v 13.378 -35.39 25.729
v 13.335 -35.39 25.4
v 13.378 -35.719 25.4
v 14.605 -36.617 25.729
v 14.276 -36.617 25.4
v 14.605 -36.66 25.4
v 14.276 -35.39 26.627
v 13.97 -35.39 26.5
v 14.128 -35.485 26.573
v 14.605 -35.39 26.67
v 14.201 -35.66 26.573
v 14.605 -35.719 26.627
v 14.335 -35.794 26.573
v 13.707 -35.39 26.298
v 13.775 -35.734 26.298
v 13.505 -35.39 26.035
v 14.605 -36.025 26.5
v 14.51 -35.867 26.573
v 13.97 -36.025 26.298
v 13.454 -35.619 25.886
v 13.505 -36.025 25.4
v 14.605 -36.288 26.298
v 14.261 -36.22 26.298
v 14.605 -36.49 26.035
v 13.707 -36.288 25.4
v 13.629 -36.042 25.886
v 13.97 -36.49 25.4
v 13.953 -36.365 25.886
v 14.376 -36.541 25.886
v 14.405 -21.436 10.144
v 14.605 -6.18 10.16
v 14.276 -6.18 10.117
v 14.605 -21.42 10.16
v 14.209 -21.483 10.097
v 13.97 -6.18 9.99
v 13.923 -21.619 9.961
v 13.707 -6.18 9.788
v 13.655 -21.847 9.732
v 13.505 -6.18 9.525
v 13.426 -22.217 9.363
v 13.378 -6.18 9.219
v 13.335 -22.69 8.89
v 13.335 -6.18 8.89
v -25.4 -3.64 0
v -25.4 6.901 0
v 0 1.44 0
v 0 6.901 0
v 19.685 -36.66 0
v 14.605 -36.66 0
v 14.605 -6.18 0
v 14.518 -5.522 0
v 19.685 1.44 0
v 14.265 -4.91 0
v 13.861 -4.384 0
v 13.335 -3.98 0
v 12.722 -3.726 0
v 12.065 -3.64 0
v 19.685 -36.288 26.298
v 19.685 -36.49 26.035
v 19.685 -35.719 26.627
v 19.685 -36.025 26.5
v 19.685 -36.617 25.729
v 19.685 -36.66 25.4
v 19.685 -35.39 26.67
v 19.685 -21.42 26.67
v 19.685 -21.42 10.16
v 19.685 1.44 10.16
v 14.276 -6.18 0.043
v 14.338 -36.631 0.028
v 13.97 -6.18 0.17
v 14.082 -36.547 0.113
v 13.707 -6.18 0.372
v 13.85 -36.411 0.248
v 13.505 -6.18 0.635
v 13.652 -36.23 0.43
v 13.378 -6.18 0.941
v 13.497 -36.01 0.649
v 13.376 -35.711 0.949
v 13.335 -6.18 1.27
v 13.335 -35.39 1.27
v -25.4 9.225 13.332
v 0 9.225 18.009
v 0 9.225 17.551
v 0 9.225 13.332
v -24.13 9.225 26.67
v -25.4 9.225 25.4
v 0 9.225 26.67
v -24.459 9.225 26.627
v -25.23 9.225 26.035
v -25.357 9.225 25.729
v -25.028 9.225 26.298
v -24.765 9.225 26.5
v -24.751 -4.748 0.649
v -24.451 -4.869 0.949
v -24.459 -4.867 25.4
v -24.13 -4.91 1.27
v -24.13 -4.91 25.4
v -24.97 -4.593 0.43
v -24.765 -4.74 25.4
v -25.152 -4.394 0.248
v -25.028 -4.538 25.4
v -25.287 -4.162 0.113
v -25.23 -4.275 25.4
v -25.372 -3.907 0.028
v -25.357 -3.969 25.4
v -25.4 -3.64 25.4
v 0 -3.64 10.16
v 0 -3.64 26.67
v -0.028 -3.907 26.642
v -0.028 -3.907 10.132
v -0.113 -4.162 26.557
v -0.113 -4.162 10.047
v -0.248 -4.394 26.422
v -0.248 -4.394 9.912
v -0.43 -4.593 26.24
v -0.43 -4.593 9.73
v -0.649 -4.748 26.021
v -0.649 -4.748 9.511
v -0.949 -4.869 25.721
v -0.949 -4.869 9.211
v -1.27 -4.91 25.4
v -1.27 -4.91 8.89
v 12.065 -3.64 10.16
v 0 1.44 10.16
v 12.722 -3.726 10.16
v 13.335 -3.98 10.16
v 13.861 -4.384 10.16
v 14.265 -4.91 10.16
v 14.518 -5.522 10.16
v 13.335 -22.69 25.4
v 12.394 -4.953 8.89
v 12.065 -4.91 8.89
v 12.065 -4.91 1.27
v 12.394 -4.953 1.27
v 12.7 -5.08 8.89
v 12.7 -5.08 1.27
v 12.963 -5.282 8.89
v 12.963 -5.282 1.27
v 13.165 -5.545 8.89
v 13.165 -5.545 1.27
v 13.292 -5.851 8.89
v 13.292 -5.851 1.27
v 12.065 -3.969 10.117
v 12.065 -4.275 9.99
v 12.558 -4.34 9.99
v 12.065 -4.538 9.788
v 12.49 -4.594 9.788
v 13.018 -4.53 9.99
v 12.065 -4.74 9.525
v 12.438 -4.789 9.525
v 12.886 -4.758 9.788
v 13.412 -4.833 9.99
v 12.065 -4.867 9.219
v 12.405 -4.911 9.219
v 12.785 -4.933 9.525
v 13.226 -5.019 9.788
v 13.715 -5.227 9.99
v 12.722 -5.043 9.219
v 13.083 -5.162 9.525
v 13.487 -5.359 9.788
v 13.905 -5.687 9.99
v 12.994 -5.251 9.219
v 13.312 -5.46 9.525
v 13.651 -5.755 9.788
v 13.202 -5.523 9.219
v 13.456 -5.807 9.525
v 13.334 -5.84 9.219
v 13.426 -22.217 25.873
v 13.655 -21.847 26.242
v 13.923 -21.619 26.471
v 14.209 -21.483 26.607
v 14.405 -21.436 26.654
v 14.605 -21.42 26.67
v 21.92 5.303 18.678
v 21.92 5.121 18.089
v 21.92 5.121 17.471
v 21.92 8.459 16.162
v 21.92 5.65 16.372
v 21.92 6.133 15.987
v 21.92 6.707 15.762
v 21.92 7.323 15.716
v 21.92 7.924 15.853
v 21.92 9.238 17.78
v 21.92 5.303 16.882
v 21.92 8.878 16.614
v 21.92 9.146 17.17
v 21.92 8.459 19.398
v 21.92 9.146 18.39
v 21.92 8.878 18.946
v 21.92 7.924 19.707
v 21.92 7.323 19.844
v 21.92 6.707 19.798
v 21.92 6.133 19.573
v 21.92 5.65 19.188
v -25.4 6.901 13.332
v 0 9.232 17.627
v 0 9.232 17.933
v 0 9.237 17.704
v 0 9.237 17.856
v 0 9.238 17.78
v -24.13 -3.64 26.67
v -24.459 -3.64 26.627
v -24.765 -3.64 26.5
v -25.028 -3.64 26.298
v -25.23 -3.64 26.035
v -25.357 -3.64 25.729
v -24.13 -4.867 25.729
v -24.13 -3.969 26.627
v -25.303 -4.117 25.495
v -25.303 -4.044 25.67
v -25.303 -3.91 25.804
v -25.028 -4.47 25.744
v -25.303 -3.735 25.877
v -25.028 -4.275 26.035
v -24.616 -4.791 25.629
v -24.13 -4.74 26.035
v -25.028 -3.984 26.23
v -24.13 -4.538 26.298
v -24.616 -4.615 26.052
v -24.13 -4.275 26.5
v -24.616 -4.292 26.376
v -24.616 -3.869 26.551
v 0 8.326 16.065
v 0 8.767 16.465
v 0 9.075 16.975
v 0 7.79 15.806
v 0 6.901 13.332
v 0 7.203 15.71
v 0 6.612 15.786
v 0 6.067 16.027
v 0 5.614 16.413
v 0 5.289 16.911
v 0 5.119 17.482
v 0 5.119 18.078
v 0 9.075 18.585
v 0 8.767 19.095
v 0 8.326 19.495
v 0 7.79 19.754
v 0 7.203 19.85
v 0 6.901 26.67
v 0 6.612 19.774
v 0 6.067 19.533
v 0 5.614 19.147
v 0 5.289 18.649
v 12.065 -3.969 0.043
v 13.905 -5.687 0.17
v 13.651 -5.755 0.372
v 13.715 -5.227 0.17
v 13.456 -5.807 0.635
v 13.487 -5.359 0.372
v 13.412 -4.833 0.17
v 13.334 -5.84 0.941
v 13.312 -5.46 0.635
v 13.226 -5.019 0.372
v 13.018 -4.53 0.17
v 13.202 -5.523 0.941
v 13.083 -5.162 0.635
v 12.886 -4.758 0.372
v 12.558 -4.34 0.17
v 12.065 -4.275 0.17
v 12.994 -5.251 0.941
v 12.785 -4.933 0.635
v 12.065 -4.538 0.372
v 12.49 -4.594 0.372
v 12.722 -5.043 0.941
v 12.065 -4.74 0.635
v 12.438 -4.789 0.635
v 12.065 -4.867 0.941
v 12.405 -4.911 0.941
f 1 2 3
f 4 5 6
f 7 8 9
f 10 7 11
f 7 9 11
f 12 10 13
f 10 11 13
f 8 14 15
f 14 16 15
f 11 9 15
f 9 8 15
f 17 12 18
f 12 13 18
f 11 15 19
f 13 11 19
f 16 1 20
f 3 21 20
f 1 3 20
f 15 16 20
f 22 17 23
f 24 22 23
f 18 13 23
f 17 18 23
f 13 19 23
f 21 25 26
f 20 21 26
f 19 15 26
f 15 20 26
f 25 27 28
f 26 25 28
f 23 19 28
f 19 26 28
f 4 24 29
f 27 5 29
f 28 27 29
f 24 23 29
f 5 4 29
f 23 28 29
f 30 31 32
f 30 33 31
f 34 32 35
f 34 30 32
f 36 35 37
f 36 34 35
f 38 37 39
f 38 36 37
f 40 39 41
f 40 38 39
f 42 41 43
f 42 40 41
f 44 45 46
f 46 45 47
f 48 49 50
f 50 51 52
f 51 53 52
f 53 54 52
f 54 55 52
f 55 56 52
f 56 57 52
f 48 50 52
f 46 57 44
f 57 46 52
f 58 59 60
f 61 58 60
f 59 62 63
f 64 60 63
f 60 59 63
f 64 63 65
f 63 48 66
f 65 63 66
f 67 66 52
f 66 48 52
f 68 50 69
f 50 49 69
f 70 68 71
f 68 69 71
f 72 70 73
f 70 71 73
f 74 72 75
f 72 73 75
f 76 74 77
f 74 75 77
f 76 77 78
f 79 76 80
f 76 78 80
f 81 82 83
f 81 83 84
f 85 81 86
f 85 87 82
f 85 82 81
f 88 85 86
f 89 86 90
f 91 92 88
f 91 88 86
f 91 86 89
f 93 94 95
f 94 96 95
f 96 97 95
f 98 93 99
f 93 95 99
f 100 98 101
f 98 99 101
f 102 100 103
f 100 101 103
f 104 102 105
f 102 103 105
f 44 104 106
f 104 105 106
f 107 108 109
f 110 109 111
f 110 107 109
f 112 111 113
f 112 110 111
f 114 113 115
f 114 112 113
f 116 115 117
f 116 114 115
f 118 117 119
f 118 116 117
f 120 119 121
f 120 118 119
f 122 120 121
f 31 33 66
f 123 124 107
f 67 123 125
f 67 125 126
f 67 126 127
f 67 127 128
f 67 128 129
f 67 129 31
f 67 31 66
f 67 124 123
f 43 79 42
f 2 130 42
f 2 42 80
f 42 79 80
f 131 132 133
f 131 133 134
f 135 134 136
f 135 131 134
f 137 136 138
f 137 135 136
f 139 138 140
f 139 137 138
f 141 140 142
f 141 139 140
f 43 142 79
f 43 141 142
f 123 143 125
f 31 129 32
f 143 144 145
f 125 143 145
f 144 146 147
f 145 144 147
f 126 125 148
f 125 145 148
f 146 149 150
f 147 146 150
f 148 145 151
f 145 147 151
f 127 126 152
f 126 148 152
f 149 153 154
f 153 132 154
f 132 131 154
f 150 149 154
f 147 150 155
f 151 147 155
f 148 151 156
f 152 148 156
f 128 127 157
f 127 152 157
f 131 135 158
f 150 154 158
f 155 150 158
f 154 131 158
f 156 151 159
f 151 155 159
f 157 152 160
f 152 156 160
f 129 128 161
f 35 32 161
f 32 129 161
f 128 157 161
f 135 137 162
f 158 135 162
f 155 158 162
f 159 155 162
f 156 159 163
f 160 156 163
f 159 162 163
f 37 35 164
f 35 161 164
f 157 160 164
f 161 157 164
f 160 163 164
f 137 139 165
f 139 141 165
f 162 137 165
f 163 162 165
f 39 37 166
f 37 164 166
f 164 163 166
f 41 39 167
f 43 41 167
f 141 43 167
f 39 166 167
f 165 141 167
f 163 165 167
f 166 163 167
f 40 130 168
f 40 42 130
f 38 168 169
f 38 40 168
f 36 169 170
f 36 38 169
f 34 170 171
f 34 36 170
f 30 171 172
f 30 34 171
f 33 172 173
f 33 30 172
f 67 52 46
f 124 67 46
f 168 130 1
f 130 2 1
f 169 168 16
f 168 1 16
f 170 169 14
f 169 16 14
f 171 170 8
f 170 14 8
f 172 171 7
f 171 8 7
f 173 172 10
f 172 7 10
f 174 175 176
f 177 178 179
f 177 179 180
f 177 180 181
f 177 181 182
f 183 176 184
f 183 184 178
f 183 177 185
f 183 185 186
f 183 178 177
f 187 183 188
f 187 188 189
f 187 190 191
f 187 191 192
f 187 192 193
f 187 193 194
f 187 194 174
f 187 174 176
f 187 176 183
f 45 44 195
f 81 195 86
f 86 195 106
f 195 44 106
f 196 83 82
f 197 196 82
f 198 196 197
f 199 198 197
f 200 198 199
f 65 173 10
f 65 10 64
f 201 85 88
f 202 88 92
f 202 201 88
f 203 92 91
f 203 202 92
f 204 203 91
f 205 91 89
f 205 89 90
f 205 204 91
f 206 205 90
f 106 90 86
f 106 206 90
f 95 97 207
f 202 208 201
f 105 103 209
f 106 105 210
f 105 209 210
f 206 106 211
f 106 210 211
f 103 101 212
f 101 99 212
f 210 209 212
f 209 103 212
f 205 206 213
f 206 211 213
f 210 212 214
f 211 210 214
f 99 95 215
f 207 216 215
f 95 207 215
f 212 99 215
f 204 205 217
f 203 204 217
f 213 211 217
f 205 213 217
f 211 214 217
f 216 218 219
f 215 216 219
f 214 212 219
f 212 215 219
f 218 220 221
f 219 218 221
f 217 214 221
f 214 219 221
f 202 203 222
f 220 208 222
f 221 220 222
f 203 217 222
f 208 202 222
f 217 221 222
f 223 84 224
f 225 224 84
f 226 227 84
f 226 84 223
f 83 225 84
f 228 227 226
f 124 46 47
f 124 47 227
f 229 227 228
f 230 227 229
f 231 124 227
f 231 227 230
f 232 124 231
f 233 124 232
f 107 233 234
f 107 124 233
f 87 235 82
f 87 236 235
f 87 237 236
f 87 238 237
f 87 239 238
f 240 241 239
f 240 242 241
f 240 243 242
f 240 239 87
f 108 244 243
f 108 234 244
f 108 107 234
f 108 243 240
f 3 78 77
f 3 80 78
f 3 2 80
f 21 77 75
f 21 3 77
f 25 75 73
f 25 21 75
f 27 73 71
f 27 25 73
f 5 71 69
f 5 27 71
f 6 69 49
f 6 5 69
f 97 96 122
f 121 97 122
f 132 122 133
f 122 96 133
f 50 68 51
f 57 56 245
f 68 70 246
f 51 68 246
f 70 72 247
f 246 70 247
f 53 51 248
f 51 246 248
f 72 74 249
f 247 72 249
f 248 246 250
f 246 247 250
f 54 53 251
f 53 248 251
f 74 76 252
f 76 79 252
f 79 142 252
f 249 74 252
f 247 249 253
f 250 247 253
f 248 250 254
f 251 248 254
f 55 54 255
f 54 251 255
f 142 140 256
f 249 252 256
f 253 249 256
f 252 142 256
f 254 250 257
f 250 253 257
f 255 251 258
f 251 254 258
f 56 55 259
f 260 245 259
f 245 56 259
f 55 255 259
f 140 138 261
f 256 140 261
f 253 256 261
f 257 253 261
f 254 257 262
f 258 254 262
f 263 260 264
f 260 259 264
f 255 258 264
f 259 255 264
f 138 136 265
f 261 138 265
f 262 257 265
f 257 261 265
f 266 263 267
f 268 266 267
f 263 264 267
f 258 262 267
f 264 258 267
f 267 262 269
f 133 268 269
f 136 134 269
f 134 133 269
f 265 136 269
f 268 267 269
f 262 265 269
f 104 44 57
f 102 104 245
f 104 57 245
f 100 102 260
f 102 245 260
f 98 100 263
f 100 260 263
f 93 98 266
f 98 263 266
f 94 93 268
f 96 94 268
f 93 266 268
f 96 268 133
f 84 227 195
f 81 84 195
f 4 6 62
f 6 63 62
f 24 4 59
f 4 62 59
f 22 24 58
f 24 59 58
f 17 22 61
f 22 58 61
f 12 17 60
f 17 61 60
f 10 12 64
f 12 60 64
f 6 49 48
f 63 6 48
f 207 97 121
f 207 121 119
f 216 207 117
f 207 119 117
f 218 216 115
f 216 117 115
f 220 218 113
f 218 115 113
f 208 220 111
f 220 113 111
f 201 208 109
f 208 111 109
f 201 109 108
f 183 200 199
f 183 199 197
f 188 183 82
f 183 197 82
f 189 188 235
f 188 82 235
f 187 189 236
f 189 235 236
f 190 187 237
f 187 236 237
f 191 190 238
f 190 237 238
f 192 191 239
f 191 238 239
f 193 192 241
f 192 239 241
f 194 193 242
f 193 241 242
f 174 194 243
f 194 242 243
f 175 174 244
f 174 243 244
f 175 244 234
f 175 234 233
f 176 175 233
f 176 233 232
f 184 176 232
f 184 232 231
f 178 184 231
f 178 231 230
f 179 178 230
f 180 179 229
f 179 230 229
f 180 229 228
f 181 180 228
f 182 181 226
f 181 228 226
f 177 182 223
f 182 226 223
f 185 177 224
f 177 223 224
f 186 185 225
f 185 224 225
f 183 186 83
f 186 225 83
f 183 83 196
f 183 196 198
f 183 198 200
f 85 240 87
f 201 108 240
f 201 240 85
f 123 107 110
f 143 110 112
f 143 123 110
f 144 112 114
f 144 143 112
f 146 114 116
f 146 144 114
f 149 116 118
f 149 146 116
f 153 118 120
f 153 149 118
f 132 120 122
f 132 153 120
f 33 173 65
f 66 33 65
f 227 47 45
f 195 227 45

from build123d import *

# Parameters (mm, degrees)
F1_DEPTH = 26.67
F2_W     = 13.335
F2_H     = 6.35
F3_DEPTH = 16.51
F4_W     = 25.4
F4_H     = 13.3375799713
F5_DEPTH = 2.3241
F6_R     = 2.0701
F7_DEPTH = 21.9202
F8_R     = 1.27


with BuildPart() as f1:
    # F0 (on Top) → F1 (new body)
    with BuildSketch(Plane.XY):
        Polygon((19.685, 1.4401404459), (13.335, 1.4401404459), (13.335, -3.6108427172), (13.335, -4.9098595541), (13.335, -36.6598595541), (19.685, -36.6598595541), align=None)
        Polygon((13.335, -3.6108427172), (13.335, 1.4401404459), (0, 1.4401404459), (0, -4.9098595541), (13.335, -4.9098595541), align=None)
        Polygon((0, -4.9098595541), (0, 1.4401404459), (0, 6.9011404459), (-25.4, 6.9011404459), (-25.4, -4.9098595541), align=None)
    extrude(amount=F1_DEPTH)

    # F2 (on face) → F3 (cut)
    with BuildSketch(Plane.XY.offset(26.67)):
        with Locations((6.6675, -1.7348595541)):
            Rectangle(F2_W, F2_H)
        Polygon((19.685, 1.4401404459), (13.335, 1.4401404459), (13.335, -4.9098595541), (13.335, -21.4198595541), (19.685, -21.4198595541), align=None)
    extrude(amount=-F3_DEPTH, mode=Mode.SUBTRACT)

    # F4 (on face) → F5 (join)
    with BuildSketch(Plane(origin=(0, 6.9011404459, 0), x_dir=(-1, 0, 0), z_dir=(0, 1, 0))):
        with Locations((12.7, 20.0012100144)):
            Rectangle(F4_W, F4_H)
    extrude(amount=F5_DEPTH)

    # F6 (on face) → F7 (join, through all)
    with BuildSketch(Plane.YZ):
        with Locations((7.1678404459, 17.78)):
            Circle(F6_R)
    extrude(amount=F7_DEPTH)

    # F8
    f8_edges = [f1.edges().sort_by_distance(p)[0] for p in [
        (-6.0325, -4.90986, 0),
        (13.335, -4.90986, 5.08),
        (6.6675, -4.90986, 10.16),
        (0, -4.90986, 18.415),
        (-12.7, -4.90986, 26.67),
        (-25.4, -4.90986, 13.335),
        (13.335, -20.78486, 0),
        (13.335, -36.65986, 13.335),
        (13.335, -29.03986, 26.67),
        (13.335, -21.41986, 18.415),
        (13.335, -13.16486, 10.16),
        (-25.4, 2.15769, 26.67),
        (16.51, -36.65986, 26.67),
    ]]
    fillet(f8_edges, radius=F8_R)


solid = f1.part
